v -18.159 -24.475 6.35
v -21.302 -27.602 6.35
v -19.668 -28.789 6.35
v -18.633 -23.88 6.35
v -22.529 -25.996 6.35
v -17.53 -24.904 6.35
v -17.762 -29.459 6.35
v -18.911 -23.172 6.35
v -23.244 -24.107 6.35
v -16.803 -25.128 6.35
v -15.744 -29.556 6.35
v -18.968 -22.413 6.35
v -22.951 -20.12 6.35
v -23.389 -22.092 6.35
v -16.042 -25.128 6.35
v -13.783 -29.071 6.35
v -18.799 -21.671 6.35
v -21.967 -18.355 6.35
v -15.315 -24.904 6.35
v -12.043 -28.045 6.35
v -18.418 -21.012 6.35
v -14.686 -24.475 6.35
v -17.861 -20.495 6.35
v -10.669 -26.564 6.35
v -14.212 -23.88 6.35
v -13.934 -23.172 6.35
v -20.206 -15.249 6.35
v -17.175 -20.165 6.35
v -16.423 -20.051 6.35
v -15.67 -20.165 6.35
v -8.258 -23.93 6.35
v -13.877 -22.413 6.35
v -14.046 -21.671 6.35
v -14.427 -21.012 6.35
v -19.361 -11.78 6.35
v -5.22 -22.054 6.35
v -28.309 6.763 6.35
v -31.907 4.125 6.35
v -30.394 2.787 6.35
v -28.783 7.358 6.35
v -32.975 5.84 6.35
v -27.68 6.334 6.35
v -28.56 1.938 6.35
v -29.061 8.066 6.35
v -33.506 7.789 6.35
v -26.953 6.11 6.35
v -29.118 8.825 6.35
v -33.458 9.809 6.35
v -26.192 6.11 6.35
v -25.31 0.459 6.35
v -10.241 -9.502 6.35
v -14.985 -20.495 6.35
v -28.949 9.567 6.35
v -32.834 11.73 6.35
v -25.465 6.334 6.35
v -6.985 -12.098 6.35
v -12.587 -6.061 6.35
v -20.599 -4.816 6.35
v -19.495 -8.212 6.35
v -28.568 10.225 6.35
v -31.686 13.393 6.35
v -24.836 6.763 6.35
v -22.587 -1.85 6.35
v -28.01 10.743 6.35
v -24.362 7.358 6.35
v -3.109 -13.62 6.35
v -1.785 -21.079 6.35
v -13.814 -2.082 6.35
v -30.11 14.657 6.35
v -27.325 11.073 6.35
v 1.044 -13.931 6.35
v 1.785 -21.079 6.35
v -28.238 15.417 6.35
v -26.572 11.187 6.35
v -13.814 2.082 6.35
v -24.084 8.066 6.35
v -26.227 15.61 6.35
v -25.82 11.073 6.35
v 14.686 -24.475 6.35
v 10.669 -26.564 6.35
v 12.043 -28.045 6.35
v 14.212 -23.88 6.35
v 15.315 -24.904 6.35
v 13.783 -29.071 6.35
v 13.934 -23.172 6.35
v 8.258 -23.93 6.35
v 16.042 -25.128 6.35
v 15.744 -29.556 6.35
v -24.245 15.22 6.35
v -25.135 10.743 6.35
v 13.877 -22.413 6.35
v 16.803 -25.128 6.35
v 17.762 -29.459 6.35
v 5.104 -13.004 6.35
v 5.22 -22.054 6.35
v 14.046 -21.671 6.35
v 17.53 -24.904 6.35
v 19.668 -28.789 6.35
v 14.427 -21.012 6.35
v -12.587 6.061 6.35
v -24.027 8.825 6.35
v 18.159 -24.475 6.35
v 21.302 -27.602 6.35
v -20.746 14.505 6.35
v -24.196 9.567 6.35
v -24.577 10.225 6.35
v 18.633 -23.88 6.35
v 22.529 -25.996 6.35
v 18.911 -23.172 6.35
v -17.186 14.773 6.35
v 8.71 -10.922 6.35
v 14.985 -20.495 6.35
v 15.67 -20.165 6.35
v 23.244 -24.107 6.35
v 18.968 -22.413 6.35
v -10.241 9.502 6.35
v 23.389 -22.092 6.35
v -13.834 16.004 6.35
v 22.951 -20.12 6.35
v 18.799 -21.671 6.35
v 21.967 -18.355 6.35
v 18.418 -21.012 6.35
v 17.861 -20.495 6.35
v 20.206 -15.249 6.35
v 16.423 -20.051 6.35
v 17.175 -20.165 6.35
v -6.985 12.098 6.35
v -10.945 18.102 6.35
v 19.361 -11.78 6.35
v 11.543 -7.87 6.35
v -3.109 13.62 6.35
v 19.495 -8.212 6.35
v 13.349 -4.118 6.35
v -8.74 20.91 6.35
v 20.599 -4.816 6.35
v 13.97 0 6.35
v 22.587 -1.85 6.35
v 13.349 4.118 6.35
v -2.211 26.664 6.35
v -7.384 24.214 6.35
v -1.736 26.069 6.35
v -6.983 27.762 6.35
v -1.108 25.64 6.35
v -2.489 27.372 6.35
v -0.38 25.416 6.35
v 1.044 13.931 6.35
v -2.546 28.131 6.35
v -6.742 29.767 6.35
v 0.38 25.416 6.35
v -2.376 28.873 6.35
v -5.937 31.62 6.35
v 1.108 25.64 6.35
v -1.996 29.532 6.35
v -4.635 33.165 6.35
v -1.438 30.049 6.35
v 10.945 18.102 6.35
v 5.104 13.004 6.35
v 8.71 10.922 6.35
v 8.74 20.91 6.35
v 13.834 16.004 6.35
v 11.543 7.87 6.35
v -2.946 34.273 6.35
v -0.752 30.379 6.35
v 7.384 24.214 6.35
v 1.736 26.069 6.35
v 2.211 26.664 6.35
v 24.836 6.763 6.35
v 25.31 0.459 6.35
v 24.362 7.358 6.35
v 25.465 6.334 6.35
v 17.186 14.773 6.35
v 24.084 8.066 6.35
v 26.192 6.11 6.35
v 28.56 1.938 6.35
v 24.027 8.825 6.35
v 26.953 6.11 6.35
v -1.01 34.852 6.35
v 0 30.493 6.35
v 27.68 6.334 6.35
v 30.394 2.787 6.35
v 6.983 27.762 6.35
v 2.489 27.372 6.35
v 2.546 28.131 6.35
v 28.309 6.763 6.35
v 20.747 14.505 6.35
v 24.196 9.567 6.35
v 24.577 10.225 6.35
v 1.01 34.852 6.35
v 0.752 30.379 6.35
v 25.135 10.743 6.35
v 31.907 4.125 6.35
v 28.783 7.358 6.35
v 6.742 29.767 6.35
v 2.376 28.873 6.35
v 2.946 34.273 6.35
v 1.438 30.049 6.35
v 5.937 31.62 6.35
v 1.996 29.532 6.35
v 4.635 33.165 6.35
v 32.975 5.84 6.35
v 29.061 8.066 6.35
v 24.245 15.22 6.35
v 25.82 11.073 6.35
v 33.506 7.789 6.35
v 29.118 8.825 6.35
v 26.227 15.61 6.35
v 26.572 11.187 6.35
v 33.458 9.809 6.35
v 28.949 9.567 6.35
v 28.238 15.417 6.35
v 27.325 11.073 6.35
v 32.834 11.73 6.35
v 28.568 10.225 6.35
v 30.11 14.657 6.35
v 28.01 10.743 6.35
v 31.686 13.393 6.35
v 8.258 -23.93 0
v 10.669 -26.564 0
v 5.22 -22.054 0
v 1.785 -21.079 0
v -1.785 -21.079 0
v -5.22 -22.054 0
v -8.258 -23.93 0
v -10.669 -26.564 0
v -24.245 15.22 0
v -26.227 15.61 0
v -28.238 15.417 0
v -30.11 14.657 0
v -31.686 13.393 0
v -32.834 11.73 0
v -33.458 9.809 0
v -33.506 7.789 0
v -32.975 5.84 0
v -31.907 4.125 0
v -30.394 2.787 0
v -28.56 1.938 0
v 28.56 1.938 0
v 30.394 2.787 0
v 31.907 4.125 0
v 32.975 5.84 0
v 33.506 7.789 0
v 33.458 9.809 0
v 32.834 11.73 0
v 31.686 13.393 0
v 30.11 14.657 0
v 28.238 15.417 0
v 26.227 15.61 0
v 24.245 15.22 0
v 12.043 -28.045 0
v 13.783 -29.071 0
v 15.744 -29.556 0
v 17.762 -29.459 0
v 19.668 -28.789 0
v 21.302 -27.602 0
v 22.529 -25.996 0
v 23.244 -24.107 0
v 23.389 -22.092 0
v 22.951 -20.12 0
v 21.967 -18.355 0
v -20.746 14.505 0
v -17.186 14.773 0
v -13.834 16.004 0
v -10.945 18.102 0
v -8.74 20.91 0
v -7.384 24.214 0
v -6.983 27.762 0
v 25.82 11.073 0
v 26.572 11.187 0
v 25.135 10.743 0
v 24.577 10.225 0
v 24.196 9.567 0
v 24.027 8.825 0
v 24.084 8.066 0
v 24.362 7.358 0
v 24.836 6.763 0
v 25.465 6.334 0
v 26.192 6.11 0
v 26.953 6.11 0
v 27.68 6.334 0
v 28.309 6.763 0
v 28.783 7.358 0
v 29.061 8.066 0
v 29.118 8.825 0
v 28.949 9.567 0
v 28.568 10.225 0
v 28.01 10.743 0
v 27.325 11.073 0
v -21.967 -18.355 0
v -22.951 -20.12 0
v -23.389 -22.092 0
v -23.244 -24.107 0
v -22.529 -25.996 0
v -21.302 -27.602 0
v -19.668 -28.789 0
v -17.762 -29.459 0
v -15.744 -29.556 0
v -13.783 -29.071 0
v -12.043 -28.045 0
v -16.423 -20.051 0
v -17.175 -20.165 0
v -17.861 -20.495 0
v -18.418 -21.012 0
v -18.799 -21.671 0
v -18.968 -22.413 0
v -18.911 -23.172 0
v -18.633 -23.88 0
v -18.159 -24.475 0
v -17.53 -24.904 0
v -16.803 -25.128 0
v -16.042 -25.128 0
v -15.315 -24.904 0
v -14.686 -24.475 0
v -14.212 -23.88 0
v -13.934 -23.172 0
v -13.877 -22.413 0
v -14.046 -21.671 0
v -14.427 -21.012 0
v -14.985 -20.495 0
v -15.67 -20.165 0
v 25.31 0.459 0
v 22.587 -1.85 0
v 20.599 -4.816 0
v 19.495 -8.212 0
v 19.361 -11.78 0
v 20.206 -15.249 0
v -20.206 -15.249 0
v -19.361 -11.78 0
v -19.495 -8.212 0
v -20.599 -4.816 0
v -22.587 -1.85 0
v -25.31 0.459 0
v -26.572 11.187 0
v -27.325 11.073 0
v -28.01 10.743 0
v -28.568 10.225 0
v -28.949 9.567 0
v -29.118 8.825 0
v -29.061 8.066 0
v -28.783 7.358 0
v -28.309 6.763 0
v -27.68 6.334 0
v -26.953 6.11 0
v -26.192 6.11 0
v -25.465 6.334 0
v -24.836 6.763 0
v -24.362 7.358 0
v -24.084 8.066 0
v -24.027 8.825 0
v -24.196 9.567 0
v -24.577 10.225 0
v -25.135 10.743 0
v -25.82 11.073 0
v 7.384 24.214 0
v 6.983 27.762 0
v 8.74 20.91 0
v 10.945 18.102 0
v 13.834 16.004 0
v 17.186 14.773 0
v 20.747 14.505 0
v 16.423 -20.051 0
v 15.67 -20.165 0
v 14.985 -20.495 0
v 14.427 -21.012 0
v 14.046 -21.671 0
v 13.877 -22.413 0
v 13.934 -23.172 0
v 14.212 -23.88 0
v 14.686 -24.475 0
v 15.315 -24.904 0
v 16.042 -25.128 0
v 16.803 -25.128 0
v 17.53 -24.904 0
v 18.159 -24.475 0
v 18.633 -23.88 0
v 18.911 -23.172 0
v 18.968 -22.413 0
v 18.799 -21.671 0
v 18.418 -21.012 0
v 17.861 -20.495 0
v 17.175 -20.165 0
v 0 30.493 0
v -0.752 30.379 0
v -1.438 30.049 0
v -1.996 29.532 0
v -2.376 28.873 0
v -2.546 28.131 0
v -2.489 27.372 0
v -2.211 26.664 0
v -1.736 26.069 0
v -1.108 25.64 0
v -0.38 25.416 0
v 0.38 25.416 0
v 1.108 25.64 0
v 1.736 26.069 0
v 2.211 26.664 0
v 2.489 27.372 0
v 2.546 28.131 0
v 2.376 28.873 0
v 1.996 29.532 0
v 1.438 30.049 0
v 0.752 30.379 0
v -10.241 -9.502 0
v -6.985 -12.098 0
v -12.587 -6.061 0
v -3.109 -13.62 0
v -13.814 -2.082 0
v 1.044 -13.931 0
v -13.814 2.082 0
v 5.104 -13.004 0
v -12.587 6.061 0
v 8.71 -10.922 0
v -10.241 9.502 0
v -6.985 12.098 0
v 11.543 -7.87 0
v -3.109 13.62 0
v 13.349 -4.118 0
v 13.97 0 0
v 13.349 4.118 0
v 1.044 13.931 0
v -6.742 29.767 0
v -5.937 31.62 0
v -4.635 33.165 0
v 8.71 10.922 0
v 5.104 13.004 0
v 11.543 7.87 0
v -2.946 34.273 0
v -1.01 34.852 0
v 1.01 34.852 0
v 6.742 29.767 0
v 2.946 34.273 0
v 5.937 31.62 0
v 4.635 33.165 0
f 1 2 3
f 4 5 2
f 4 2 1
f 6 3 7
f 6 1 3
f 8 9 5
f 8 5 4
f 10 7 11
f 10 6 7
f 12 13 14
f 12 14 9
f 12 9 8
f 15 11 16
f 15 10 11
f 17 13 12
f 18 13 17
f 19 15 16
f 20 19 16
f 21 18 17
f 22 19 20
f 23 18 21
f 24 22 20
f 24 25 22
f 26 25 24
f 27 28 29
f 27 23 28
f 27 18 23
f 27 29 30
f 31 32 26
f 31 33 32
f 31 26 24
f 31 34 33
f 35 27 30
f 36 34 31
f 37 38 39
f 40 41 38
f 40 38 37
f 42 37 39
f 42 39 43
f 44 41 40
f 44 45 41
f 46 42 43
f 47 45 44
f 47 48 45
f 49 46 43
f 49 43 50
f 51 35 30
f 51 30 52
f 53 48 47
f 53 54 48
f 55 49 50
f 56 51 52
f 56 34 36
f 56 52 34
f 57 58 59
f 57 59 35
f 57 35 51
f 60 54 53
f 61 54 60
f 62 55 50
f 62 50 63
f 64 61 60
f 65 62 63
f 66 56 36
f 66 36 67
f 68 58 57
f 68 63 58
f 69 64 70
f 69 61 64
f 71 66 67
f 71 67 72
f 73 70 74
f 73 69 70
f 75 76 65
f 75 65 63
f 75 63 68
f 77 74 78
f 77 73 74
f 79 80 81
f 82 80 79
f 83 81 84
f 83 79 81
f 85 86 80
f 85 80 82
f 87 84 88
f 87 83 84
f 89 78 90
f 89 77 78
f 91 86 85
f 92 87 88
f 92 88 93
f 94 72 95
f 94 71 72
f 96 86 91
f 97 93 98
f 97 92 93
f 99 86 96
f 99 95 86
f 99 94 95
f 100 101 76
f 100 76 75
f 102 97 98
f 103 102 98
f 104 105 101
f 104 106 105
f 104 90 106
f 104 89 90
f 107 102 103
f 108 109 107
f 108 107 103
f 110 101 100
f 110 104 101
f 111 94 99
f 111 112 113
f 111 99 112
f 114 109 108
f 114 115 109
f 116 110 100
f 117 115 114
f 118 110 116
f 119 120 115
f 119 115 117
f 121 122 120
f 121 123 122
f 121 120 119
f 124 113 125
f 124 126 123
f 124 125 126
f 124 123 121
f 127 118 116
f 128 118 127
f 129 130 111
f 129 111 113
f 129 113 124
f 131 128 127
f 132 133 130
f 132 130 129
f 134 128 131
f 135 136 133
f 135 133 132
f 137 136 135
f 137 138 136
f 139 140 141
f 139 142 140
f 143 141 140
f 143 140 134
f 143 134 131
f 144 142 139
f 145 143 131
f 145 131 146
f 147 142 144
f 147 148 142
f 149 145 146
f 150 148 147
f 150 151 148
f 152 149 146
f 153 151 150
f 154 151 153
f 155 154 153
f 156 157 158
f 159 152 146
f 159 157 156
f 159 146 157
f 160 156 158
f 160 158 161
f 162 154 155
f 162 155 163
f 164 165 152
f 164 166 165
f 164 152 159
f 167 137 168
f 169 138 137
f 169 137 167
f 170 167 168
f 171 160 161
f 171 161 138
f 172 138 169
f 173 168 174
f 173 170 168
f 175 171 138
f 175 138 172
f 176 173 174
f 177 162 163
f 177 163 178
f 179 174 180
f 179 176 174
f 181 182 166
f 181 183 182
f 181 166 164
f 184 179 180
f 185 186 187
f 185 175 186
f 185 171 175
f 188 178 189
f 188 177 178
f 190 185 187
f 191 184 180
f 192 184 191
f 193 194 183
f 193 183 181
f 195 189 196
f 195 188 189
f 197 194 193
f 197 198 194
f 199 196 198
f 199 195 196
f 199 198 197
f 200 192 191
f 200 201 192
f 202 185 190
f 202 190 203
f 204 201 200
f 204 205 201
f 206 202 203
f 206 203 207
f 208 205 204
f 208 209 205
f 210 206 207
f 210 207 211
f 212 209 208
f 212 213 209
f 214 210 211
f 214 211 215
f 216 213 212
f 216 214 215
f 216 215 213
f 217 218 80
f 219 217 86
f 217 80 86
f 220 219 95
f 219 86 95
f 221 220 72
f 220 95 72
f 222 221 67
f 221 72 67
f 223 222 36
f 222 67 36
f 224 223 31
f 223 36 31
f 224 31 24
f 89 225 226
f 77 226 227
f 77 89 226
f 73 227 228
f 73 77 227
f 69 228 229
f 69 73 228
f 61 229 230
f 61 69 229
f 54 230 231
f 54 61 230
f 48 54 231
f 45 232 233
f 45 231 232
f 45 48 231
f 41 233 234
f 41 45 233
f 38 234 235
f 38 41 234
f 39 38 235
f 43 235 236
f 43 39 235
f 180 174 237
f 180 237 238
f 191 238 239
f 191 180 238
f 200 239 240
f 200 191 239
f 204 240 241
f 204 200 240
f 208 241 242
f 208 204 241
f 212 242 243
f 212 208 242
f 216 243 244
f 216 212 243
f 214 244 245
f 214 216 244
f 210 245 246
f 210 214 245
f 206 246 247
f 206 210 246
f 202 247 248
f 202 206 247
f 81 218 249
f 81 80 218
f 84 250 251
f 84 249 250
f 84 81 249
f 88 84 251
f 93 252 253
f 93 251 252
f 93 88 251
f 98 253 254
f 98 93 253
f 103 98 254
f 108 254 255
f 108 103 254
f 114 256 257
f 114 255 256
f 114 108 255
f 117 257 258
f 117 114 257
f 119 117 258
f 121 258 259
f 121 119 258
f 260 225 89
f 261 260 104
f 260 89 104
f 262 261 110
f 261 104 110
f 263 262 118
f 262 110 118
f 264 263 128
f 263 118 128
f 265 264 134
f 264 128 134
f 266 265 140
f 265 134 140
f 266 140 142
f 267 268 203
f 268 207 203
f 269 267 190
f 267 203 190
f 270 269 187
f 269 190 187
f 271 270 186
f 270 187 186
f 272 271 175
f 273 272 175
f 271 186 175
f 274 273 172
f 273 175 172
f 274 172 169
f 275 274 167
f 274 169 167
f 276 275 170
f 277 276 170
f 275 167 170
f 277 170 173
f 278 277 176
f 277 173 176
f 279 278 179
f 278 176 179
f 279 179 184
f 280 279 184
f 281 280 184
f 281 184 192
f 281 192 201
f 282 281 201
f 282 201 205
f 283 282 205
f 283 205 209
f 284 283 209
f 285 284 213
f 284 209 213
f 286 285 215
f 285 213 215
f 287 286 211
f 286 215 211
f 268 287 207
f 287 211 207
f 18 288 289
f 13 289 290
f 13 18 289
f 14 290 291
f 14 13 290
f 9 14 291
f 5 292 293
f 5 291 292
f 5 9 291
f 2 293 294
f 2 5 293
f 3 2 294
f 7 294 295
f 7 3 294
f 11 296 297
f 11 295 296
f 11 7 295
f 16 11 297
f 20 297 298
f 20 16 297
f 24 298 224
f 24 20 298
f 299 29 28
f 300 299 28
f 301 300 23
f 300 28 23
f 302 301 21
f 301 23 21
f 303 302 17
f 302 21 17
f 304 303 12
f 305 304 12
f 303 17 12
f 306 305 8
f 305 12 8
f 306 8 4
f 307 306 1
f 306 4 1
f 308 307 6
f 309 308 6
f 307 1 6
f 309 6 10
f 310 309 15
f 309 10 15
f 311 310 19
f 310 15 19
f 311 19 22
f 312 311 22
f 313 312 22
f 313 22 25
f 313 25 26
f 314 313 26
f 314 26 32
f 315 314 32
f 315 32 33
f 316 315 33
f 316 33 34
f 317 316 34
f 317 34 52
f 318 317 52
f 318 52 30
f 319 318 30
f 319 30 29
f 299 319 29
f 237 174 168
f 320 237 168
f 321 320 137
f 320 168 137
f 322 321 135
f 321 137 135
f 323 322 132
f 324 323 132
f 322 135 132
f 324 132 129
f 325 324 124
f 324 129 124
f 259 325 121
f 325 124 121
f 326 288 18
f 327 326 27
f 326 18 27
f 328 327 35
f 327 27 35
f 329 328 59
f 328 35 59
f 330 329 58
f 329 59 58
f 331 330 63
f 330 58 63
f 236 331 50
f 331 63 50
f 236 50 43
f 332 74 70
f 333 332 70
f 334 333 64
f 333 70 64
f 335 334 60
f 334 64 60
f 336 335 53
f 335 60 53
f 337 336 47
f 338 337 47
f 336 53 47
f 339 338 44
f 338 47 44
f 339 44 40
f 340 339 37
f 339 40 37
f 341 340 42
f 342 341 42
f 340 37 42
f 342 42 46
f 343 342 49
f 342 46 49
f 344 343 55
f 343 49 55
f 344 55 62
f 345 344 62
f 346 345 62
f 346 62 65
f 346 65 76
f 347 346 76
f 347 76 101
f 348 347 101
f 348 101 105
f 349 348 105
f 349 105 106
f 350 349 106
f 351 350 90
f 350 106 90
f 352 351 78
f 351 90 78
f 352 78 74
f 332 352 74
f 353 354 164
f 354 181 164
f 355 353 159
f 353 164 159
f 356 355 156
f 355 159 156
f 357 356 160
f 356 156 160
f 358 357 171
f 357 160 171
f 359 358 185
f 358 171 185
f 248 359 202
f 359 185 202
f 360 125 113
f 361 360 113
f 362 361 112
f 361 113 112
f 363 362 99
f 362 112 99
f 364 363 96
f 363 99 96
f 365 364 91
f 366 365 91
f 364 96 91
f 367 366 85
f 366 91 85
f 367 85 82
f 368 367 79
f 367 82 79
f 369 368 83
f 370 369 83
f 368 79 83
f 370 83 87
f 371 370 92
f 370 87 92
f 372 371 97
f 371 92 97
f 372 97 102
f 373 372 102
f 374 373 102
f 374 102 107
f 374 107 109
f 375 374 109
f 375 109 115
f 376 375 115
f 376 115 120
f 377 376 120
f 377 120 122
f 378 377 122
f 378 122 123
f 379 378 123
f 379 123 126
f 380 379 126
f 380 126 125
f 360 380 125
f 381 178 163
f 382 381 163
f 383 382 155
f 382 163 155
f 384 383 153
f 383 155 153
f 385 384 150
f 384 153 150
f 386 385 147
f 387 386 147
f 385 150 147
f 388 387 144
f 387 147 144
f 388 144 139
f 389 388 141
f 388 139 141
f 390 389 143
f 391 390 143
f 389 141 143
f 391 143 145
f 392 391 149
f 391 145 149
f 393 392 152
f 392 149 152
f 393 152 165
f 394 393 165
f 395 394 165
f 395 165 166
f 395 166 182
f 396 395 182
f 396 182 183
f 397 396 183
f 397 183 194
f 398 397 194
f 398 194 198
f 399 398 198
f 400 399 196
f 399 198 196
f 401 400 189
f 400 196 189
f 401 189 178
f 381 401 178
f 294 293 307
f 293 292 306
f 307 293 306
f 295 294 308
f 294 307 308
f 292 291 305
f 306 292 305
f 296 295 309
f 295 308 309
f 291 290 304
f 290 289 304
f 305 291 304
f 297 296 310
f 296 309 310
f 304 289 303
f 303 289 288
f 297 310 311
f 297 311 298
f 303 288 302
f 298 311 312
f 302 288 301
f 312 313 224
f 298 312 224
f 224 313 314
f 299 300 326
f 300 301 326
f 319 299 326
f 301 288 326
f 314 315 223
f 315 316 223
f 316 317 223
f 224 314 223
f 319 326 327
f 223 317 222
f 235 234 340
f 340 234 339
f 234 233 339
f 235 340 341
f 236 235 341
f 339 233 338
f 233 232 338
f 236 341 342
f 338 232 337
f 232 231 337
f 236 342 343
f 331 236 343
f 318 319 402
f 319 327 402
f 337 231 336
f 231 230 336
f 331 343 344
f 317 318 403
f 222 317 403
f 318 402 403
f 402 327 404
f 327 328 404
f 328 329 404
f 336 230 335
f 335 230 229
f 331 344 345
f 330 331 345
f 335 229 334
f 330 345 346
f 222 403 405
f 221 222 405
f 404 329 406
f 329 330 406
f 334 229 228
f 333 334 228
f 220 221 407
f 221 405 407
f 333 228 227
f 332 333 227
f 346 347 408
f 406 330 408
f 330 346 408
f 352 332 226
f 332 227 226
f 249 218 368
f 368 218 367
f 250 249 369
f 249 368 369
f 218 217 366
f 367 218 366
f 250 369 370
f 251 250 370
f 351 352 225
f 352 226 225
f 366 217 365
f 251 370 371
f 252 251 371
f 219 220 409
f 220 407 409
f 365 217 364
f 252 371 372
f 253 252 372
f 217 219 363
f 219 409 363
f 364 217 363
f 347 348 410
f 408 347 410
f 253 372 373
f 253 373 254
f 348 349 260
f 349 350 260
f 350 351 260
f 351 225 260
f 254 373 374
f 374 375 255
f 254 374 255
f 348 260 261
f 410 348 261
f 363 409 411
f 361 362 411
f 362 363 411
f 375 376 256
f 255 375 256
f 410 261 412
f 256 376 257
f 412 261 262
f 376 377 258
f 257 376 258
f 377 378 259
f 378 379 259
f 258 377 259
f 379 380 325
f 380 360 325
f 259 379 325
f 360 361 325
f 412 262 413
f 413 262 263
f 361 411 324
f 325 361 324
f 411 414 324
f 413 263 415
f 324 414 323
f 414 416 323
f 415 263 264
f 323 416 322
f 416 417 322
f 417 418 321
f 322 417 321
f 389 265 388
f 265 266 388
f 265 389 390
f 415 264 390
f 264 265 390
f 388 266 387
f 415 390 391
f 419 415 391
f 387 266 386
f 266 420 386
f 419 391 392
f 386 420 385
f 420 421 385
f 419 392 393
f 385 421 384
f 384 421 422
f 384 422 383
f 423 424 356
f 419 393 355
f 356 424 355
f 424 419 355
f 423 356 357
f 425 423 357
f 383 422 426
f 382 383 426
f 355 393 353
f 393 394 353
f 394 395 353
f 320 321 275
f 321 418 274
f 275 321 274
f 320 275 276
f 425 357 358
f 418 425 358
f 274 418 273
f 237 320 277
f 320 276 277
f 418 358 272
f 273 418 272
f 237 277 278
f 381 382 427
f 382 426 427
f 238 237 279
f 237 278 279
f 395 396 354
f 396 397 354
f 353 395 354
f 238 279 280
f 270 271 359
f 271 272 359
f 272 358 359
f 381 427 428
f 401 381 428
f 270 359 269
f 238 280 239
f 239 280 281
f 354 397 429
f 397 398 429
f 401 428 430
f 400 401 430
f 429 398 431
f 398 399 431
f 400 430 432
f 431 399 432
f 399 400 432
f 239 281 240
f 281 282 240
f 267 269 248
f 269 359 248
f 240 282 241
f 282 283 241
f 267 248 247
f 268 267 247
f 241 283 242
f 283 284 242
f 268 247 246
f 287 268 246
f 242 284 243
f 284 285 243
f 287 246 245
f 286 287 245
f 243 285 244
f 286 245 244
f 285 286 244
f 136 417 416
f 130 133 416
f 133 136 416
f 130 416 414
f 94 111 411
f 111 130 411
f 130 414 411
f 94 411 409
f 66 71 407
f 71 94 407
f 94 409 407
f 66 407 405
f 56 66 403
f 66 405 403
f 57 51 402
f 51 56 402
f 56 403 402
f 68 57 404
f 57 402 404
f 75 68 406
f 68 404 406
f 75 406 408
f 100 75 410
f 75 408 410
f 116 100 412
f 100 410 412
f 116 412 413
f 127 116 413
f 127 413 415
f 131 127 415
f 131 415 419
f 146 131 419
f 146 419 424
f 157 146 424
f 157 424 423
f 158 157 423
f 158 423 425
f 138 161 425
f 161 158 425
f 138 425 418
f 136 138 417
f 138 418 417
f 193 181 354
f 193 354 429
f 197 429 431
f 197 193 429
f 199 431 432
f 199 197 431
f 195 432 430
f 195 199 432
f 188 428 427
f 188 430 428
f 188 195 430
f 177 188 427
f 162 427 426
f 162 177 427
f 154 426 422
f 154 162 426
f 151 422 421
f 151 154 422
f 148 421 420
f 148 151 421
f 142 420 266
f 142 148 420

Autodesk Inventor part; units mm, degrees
ref_plane "YZ Plane" through (0, 0, 0) normal (1, 0, 0) x (0, 1, 0)
ref_plane "XZ Plane" through (0, 0, 0) normal (0, 1, 0) x (-1, 0, 0)
ref_plane "XY Plane" through (0, 0, 0) normal (0, 0, 1) x (1, 0, 0)
sketch "Sketch1" plane through (0, 0, 0) normal (0, 0, 1) x (1, 0, 0)
  circle A0 centre (0, 0) radius 13.97
  circle A1 centre (0, 0) radius 34.925
  circle A2 centre (0, 0) radius 27.94
  point P0 (0, 27.94)
  point P1 (-26.5725, 8.6339)
  point P2 (-16.4227, -22.6039)
  point P3 (16.4227, -22.6039)
  point P4 (26.5725, 8.6339)
  dimension "d2" = 55.88
  dimension "d0" = 27.94
  dimension "d1" = 69.85
  dimension "d5" = 360
extrude "Extrusion1" add sketch "Sketch1" along normal blind 6.35 contours A1 | A2
hole "Hole1" at (0, 27.94, 0) at (-26.5725, 8.6339, 0) at (-16.4227, -22.6039, 0) at (16.4227, -22.6039, 0) at (26.5725, 8.6339, 0) direction (0, 0, 1) diameter 5.1054 end through all
thread "Thread1" size "1/4-20 UNC" class "2B" standard "ANSI Unified Screw Threads" full length
thread "Thread2" size "12-24 UNC" class "2B" standard "ANSI Unified Screw Threads" full length
thread "Thread3" size "12-24 UNC" class "2B" standard "ANSI Unified Screw Threads" full length
thread "Thread4" size "12-24 UNC" class "2B" standard "ANSI Unified Screw Threads" full length
thread "Thread5" size "12-24 UNC" class "2B" standard "ANSI Unified Screw Threads" full length
sketch "Sketch2" plane through (0, 0, 6.35) normal (0, 0, 1) x (1, 0, 0)
  circle A0 centre (0, 27.94) radius 2.5527 projected
  circle A1 centre (-26.5725, 8.6339) radius 2.5527 projected
  circle A2 centre (-16.4227, -22.6039) radius 2.5527 projected
  circle A3 centre (16.4227, -22.6039) radius 2.5527 projected
  circle A4 centre (26.5725, 8.6339) radius 2.5527 projected
  circle A5 centre (-26.5725, 8.6339) radius 6.985
  circle A6 centre (0, 27.94) radius 6.985
  circle A7 centre (26.5725, 8.6339) radius 6.985
  circle A8 centre (16.4227, -22.6039) radius 6.985
  circle A9 centre (-16.4227, -22.6039) radius 6.985
  circle A10 centre (0, 0) radius 34.925 projected
  circle A11 centre (0, 0) radius 20.955
  arc A12 (-24.2449, 15.2197) -> (-6.9827, 27.7615) centre (-19.9294, 27.4305) ccw
  arc A13 (-21.9669, -18.3552) -> (-28.5605, 1.9378) centre (-32.2464, -10.4775) ccw
  arc A14 (10.6686, -26.5638) -> (-10.6686, -26.5638) centre (0, -33.9059) ccw
  arc A15 (28.5605, 1.9378) -> (21.9669, -18.3552) centre (32.2464, -10.4775) ccw
  arc A16 (6.9827, 27.7615) -> (24.2449, 15.2197) centre (19.9294, 27.4305) ccw
  point P0 (-28.5605, 1.9378)
  point P1 (-33.2156, 10.7924)
  point P2 (-20.5284, -28.2549)
  point P3 (-21.9669, -18.3552)
  point P4 (0, 34.925)
  point P5 (33.2156, 10.7924)
  point P6 (6.9827, 27.7615)
  point P7 (21.9669, -18.3552)
  point P8 (20.5284, -28.2549)
  point P9 (28.5605, 1.9378)
  point P10 (-10.6686, -26.5638)
  point P11 (10.6686, -26.5638)
  dimension "d29" = 360
extrude "Extrusion2" cut sketch "Sketch2" against normal blind 25.4 contours A5 A10 A6 A12 | A5 A13 A9 A10 | A10 A7 A16 A6 | A9 A14 A8 A10 | A10 A8 A15 A7
properties part number "panel_flange"
